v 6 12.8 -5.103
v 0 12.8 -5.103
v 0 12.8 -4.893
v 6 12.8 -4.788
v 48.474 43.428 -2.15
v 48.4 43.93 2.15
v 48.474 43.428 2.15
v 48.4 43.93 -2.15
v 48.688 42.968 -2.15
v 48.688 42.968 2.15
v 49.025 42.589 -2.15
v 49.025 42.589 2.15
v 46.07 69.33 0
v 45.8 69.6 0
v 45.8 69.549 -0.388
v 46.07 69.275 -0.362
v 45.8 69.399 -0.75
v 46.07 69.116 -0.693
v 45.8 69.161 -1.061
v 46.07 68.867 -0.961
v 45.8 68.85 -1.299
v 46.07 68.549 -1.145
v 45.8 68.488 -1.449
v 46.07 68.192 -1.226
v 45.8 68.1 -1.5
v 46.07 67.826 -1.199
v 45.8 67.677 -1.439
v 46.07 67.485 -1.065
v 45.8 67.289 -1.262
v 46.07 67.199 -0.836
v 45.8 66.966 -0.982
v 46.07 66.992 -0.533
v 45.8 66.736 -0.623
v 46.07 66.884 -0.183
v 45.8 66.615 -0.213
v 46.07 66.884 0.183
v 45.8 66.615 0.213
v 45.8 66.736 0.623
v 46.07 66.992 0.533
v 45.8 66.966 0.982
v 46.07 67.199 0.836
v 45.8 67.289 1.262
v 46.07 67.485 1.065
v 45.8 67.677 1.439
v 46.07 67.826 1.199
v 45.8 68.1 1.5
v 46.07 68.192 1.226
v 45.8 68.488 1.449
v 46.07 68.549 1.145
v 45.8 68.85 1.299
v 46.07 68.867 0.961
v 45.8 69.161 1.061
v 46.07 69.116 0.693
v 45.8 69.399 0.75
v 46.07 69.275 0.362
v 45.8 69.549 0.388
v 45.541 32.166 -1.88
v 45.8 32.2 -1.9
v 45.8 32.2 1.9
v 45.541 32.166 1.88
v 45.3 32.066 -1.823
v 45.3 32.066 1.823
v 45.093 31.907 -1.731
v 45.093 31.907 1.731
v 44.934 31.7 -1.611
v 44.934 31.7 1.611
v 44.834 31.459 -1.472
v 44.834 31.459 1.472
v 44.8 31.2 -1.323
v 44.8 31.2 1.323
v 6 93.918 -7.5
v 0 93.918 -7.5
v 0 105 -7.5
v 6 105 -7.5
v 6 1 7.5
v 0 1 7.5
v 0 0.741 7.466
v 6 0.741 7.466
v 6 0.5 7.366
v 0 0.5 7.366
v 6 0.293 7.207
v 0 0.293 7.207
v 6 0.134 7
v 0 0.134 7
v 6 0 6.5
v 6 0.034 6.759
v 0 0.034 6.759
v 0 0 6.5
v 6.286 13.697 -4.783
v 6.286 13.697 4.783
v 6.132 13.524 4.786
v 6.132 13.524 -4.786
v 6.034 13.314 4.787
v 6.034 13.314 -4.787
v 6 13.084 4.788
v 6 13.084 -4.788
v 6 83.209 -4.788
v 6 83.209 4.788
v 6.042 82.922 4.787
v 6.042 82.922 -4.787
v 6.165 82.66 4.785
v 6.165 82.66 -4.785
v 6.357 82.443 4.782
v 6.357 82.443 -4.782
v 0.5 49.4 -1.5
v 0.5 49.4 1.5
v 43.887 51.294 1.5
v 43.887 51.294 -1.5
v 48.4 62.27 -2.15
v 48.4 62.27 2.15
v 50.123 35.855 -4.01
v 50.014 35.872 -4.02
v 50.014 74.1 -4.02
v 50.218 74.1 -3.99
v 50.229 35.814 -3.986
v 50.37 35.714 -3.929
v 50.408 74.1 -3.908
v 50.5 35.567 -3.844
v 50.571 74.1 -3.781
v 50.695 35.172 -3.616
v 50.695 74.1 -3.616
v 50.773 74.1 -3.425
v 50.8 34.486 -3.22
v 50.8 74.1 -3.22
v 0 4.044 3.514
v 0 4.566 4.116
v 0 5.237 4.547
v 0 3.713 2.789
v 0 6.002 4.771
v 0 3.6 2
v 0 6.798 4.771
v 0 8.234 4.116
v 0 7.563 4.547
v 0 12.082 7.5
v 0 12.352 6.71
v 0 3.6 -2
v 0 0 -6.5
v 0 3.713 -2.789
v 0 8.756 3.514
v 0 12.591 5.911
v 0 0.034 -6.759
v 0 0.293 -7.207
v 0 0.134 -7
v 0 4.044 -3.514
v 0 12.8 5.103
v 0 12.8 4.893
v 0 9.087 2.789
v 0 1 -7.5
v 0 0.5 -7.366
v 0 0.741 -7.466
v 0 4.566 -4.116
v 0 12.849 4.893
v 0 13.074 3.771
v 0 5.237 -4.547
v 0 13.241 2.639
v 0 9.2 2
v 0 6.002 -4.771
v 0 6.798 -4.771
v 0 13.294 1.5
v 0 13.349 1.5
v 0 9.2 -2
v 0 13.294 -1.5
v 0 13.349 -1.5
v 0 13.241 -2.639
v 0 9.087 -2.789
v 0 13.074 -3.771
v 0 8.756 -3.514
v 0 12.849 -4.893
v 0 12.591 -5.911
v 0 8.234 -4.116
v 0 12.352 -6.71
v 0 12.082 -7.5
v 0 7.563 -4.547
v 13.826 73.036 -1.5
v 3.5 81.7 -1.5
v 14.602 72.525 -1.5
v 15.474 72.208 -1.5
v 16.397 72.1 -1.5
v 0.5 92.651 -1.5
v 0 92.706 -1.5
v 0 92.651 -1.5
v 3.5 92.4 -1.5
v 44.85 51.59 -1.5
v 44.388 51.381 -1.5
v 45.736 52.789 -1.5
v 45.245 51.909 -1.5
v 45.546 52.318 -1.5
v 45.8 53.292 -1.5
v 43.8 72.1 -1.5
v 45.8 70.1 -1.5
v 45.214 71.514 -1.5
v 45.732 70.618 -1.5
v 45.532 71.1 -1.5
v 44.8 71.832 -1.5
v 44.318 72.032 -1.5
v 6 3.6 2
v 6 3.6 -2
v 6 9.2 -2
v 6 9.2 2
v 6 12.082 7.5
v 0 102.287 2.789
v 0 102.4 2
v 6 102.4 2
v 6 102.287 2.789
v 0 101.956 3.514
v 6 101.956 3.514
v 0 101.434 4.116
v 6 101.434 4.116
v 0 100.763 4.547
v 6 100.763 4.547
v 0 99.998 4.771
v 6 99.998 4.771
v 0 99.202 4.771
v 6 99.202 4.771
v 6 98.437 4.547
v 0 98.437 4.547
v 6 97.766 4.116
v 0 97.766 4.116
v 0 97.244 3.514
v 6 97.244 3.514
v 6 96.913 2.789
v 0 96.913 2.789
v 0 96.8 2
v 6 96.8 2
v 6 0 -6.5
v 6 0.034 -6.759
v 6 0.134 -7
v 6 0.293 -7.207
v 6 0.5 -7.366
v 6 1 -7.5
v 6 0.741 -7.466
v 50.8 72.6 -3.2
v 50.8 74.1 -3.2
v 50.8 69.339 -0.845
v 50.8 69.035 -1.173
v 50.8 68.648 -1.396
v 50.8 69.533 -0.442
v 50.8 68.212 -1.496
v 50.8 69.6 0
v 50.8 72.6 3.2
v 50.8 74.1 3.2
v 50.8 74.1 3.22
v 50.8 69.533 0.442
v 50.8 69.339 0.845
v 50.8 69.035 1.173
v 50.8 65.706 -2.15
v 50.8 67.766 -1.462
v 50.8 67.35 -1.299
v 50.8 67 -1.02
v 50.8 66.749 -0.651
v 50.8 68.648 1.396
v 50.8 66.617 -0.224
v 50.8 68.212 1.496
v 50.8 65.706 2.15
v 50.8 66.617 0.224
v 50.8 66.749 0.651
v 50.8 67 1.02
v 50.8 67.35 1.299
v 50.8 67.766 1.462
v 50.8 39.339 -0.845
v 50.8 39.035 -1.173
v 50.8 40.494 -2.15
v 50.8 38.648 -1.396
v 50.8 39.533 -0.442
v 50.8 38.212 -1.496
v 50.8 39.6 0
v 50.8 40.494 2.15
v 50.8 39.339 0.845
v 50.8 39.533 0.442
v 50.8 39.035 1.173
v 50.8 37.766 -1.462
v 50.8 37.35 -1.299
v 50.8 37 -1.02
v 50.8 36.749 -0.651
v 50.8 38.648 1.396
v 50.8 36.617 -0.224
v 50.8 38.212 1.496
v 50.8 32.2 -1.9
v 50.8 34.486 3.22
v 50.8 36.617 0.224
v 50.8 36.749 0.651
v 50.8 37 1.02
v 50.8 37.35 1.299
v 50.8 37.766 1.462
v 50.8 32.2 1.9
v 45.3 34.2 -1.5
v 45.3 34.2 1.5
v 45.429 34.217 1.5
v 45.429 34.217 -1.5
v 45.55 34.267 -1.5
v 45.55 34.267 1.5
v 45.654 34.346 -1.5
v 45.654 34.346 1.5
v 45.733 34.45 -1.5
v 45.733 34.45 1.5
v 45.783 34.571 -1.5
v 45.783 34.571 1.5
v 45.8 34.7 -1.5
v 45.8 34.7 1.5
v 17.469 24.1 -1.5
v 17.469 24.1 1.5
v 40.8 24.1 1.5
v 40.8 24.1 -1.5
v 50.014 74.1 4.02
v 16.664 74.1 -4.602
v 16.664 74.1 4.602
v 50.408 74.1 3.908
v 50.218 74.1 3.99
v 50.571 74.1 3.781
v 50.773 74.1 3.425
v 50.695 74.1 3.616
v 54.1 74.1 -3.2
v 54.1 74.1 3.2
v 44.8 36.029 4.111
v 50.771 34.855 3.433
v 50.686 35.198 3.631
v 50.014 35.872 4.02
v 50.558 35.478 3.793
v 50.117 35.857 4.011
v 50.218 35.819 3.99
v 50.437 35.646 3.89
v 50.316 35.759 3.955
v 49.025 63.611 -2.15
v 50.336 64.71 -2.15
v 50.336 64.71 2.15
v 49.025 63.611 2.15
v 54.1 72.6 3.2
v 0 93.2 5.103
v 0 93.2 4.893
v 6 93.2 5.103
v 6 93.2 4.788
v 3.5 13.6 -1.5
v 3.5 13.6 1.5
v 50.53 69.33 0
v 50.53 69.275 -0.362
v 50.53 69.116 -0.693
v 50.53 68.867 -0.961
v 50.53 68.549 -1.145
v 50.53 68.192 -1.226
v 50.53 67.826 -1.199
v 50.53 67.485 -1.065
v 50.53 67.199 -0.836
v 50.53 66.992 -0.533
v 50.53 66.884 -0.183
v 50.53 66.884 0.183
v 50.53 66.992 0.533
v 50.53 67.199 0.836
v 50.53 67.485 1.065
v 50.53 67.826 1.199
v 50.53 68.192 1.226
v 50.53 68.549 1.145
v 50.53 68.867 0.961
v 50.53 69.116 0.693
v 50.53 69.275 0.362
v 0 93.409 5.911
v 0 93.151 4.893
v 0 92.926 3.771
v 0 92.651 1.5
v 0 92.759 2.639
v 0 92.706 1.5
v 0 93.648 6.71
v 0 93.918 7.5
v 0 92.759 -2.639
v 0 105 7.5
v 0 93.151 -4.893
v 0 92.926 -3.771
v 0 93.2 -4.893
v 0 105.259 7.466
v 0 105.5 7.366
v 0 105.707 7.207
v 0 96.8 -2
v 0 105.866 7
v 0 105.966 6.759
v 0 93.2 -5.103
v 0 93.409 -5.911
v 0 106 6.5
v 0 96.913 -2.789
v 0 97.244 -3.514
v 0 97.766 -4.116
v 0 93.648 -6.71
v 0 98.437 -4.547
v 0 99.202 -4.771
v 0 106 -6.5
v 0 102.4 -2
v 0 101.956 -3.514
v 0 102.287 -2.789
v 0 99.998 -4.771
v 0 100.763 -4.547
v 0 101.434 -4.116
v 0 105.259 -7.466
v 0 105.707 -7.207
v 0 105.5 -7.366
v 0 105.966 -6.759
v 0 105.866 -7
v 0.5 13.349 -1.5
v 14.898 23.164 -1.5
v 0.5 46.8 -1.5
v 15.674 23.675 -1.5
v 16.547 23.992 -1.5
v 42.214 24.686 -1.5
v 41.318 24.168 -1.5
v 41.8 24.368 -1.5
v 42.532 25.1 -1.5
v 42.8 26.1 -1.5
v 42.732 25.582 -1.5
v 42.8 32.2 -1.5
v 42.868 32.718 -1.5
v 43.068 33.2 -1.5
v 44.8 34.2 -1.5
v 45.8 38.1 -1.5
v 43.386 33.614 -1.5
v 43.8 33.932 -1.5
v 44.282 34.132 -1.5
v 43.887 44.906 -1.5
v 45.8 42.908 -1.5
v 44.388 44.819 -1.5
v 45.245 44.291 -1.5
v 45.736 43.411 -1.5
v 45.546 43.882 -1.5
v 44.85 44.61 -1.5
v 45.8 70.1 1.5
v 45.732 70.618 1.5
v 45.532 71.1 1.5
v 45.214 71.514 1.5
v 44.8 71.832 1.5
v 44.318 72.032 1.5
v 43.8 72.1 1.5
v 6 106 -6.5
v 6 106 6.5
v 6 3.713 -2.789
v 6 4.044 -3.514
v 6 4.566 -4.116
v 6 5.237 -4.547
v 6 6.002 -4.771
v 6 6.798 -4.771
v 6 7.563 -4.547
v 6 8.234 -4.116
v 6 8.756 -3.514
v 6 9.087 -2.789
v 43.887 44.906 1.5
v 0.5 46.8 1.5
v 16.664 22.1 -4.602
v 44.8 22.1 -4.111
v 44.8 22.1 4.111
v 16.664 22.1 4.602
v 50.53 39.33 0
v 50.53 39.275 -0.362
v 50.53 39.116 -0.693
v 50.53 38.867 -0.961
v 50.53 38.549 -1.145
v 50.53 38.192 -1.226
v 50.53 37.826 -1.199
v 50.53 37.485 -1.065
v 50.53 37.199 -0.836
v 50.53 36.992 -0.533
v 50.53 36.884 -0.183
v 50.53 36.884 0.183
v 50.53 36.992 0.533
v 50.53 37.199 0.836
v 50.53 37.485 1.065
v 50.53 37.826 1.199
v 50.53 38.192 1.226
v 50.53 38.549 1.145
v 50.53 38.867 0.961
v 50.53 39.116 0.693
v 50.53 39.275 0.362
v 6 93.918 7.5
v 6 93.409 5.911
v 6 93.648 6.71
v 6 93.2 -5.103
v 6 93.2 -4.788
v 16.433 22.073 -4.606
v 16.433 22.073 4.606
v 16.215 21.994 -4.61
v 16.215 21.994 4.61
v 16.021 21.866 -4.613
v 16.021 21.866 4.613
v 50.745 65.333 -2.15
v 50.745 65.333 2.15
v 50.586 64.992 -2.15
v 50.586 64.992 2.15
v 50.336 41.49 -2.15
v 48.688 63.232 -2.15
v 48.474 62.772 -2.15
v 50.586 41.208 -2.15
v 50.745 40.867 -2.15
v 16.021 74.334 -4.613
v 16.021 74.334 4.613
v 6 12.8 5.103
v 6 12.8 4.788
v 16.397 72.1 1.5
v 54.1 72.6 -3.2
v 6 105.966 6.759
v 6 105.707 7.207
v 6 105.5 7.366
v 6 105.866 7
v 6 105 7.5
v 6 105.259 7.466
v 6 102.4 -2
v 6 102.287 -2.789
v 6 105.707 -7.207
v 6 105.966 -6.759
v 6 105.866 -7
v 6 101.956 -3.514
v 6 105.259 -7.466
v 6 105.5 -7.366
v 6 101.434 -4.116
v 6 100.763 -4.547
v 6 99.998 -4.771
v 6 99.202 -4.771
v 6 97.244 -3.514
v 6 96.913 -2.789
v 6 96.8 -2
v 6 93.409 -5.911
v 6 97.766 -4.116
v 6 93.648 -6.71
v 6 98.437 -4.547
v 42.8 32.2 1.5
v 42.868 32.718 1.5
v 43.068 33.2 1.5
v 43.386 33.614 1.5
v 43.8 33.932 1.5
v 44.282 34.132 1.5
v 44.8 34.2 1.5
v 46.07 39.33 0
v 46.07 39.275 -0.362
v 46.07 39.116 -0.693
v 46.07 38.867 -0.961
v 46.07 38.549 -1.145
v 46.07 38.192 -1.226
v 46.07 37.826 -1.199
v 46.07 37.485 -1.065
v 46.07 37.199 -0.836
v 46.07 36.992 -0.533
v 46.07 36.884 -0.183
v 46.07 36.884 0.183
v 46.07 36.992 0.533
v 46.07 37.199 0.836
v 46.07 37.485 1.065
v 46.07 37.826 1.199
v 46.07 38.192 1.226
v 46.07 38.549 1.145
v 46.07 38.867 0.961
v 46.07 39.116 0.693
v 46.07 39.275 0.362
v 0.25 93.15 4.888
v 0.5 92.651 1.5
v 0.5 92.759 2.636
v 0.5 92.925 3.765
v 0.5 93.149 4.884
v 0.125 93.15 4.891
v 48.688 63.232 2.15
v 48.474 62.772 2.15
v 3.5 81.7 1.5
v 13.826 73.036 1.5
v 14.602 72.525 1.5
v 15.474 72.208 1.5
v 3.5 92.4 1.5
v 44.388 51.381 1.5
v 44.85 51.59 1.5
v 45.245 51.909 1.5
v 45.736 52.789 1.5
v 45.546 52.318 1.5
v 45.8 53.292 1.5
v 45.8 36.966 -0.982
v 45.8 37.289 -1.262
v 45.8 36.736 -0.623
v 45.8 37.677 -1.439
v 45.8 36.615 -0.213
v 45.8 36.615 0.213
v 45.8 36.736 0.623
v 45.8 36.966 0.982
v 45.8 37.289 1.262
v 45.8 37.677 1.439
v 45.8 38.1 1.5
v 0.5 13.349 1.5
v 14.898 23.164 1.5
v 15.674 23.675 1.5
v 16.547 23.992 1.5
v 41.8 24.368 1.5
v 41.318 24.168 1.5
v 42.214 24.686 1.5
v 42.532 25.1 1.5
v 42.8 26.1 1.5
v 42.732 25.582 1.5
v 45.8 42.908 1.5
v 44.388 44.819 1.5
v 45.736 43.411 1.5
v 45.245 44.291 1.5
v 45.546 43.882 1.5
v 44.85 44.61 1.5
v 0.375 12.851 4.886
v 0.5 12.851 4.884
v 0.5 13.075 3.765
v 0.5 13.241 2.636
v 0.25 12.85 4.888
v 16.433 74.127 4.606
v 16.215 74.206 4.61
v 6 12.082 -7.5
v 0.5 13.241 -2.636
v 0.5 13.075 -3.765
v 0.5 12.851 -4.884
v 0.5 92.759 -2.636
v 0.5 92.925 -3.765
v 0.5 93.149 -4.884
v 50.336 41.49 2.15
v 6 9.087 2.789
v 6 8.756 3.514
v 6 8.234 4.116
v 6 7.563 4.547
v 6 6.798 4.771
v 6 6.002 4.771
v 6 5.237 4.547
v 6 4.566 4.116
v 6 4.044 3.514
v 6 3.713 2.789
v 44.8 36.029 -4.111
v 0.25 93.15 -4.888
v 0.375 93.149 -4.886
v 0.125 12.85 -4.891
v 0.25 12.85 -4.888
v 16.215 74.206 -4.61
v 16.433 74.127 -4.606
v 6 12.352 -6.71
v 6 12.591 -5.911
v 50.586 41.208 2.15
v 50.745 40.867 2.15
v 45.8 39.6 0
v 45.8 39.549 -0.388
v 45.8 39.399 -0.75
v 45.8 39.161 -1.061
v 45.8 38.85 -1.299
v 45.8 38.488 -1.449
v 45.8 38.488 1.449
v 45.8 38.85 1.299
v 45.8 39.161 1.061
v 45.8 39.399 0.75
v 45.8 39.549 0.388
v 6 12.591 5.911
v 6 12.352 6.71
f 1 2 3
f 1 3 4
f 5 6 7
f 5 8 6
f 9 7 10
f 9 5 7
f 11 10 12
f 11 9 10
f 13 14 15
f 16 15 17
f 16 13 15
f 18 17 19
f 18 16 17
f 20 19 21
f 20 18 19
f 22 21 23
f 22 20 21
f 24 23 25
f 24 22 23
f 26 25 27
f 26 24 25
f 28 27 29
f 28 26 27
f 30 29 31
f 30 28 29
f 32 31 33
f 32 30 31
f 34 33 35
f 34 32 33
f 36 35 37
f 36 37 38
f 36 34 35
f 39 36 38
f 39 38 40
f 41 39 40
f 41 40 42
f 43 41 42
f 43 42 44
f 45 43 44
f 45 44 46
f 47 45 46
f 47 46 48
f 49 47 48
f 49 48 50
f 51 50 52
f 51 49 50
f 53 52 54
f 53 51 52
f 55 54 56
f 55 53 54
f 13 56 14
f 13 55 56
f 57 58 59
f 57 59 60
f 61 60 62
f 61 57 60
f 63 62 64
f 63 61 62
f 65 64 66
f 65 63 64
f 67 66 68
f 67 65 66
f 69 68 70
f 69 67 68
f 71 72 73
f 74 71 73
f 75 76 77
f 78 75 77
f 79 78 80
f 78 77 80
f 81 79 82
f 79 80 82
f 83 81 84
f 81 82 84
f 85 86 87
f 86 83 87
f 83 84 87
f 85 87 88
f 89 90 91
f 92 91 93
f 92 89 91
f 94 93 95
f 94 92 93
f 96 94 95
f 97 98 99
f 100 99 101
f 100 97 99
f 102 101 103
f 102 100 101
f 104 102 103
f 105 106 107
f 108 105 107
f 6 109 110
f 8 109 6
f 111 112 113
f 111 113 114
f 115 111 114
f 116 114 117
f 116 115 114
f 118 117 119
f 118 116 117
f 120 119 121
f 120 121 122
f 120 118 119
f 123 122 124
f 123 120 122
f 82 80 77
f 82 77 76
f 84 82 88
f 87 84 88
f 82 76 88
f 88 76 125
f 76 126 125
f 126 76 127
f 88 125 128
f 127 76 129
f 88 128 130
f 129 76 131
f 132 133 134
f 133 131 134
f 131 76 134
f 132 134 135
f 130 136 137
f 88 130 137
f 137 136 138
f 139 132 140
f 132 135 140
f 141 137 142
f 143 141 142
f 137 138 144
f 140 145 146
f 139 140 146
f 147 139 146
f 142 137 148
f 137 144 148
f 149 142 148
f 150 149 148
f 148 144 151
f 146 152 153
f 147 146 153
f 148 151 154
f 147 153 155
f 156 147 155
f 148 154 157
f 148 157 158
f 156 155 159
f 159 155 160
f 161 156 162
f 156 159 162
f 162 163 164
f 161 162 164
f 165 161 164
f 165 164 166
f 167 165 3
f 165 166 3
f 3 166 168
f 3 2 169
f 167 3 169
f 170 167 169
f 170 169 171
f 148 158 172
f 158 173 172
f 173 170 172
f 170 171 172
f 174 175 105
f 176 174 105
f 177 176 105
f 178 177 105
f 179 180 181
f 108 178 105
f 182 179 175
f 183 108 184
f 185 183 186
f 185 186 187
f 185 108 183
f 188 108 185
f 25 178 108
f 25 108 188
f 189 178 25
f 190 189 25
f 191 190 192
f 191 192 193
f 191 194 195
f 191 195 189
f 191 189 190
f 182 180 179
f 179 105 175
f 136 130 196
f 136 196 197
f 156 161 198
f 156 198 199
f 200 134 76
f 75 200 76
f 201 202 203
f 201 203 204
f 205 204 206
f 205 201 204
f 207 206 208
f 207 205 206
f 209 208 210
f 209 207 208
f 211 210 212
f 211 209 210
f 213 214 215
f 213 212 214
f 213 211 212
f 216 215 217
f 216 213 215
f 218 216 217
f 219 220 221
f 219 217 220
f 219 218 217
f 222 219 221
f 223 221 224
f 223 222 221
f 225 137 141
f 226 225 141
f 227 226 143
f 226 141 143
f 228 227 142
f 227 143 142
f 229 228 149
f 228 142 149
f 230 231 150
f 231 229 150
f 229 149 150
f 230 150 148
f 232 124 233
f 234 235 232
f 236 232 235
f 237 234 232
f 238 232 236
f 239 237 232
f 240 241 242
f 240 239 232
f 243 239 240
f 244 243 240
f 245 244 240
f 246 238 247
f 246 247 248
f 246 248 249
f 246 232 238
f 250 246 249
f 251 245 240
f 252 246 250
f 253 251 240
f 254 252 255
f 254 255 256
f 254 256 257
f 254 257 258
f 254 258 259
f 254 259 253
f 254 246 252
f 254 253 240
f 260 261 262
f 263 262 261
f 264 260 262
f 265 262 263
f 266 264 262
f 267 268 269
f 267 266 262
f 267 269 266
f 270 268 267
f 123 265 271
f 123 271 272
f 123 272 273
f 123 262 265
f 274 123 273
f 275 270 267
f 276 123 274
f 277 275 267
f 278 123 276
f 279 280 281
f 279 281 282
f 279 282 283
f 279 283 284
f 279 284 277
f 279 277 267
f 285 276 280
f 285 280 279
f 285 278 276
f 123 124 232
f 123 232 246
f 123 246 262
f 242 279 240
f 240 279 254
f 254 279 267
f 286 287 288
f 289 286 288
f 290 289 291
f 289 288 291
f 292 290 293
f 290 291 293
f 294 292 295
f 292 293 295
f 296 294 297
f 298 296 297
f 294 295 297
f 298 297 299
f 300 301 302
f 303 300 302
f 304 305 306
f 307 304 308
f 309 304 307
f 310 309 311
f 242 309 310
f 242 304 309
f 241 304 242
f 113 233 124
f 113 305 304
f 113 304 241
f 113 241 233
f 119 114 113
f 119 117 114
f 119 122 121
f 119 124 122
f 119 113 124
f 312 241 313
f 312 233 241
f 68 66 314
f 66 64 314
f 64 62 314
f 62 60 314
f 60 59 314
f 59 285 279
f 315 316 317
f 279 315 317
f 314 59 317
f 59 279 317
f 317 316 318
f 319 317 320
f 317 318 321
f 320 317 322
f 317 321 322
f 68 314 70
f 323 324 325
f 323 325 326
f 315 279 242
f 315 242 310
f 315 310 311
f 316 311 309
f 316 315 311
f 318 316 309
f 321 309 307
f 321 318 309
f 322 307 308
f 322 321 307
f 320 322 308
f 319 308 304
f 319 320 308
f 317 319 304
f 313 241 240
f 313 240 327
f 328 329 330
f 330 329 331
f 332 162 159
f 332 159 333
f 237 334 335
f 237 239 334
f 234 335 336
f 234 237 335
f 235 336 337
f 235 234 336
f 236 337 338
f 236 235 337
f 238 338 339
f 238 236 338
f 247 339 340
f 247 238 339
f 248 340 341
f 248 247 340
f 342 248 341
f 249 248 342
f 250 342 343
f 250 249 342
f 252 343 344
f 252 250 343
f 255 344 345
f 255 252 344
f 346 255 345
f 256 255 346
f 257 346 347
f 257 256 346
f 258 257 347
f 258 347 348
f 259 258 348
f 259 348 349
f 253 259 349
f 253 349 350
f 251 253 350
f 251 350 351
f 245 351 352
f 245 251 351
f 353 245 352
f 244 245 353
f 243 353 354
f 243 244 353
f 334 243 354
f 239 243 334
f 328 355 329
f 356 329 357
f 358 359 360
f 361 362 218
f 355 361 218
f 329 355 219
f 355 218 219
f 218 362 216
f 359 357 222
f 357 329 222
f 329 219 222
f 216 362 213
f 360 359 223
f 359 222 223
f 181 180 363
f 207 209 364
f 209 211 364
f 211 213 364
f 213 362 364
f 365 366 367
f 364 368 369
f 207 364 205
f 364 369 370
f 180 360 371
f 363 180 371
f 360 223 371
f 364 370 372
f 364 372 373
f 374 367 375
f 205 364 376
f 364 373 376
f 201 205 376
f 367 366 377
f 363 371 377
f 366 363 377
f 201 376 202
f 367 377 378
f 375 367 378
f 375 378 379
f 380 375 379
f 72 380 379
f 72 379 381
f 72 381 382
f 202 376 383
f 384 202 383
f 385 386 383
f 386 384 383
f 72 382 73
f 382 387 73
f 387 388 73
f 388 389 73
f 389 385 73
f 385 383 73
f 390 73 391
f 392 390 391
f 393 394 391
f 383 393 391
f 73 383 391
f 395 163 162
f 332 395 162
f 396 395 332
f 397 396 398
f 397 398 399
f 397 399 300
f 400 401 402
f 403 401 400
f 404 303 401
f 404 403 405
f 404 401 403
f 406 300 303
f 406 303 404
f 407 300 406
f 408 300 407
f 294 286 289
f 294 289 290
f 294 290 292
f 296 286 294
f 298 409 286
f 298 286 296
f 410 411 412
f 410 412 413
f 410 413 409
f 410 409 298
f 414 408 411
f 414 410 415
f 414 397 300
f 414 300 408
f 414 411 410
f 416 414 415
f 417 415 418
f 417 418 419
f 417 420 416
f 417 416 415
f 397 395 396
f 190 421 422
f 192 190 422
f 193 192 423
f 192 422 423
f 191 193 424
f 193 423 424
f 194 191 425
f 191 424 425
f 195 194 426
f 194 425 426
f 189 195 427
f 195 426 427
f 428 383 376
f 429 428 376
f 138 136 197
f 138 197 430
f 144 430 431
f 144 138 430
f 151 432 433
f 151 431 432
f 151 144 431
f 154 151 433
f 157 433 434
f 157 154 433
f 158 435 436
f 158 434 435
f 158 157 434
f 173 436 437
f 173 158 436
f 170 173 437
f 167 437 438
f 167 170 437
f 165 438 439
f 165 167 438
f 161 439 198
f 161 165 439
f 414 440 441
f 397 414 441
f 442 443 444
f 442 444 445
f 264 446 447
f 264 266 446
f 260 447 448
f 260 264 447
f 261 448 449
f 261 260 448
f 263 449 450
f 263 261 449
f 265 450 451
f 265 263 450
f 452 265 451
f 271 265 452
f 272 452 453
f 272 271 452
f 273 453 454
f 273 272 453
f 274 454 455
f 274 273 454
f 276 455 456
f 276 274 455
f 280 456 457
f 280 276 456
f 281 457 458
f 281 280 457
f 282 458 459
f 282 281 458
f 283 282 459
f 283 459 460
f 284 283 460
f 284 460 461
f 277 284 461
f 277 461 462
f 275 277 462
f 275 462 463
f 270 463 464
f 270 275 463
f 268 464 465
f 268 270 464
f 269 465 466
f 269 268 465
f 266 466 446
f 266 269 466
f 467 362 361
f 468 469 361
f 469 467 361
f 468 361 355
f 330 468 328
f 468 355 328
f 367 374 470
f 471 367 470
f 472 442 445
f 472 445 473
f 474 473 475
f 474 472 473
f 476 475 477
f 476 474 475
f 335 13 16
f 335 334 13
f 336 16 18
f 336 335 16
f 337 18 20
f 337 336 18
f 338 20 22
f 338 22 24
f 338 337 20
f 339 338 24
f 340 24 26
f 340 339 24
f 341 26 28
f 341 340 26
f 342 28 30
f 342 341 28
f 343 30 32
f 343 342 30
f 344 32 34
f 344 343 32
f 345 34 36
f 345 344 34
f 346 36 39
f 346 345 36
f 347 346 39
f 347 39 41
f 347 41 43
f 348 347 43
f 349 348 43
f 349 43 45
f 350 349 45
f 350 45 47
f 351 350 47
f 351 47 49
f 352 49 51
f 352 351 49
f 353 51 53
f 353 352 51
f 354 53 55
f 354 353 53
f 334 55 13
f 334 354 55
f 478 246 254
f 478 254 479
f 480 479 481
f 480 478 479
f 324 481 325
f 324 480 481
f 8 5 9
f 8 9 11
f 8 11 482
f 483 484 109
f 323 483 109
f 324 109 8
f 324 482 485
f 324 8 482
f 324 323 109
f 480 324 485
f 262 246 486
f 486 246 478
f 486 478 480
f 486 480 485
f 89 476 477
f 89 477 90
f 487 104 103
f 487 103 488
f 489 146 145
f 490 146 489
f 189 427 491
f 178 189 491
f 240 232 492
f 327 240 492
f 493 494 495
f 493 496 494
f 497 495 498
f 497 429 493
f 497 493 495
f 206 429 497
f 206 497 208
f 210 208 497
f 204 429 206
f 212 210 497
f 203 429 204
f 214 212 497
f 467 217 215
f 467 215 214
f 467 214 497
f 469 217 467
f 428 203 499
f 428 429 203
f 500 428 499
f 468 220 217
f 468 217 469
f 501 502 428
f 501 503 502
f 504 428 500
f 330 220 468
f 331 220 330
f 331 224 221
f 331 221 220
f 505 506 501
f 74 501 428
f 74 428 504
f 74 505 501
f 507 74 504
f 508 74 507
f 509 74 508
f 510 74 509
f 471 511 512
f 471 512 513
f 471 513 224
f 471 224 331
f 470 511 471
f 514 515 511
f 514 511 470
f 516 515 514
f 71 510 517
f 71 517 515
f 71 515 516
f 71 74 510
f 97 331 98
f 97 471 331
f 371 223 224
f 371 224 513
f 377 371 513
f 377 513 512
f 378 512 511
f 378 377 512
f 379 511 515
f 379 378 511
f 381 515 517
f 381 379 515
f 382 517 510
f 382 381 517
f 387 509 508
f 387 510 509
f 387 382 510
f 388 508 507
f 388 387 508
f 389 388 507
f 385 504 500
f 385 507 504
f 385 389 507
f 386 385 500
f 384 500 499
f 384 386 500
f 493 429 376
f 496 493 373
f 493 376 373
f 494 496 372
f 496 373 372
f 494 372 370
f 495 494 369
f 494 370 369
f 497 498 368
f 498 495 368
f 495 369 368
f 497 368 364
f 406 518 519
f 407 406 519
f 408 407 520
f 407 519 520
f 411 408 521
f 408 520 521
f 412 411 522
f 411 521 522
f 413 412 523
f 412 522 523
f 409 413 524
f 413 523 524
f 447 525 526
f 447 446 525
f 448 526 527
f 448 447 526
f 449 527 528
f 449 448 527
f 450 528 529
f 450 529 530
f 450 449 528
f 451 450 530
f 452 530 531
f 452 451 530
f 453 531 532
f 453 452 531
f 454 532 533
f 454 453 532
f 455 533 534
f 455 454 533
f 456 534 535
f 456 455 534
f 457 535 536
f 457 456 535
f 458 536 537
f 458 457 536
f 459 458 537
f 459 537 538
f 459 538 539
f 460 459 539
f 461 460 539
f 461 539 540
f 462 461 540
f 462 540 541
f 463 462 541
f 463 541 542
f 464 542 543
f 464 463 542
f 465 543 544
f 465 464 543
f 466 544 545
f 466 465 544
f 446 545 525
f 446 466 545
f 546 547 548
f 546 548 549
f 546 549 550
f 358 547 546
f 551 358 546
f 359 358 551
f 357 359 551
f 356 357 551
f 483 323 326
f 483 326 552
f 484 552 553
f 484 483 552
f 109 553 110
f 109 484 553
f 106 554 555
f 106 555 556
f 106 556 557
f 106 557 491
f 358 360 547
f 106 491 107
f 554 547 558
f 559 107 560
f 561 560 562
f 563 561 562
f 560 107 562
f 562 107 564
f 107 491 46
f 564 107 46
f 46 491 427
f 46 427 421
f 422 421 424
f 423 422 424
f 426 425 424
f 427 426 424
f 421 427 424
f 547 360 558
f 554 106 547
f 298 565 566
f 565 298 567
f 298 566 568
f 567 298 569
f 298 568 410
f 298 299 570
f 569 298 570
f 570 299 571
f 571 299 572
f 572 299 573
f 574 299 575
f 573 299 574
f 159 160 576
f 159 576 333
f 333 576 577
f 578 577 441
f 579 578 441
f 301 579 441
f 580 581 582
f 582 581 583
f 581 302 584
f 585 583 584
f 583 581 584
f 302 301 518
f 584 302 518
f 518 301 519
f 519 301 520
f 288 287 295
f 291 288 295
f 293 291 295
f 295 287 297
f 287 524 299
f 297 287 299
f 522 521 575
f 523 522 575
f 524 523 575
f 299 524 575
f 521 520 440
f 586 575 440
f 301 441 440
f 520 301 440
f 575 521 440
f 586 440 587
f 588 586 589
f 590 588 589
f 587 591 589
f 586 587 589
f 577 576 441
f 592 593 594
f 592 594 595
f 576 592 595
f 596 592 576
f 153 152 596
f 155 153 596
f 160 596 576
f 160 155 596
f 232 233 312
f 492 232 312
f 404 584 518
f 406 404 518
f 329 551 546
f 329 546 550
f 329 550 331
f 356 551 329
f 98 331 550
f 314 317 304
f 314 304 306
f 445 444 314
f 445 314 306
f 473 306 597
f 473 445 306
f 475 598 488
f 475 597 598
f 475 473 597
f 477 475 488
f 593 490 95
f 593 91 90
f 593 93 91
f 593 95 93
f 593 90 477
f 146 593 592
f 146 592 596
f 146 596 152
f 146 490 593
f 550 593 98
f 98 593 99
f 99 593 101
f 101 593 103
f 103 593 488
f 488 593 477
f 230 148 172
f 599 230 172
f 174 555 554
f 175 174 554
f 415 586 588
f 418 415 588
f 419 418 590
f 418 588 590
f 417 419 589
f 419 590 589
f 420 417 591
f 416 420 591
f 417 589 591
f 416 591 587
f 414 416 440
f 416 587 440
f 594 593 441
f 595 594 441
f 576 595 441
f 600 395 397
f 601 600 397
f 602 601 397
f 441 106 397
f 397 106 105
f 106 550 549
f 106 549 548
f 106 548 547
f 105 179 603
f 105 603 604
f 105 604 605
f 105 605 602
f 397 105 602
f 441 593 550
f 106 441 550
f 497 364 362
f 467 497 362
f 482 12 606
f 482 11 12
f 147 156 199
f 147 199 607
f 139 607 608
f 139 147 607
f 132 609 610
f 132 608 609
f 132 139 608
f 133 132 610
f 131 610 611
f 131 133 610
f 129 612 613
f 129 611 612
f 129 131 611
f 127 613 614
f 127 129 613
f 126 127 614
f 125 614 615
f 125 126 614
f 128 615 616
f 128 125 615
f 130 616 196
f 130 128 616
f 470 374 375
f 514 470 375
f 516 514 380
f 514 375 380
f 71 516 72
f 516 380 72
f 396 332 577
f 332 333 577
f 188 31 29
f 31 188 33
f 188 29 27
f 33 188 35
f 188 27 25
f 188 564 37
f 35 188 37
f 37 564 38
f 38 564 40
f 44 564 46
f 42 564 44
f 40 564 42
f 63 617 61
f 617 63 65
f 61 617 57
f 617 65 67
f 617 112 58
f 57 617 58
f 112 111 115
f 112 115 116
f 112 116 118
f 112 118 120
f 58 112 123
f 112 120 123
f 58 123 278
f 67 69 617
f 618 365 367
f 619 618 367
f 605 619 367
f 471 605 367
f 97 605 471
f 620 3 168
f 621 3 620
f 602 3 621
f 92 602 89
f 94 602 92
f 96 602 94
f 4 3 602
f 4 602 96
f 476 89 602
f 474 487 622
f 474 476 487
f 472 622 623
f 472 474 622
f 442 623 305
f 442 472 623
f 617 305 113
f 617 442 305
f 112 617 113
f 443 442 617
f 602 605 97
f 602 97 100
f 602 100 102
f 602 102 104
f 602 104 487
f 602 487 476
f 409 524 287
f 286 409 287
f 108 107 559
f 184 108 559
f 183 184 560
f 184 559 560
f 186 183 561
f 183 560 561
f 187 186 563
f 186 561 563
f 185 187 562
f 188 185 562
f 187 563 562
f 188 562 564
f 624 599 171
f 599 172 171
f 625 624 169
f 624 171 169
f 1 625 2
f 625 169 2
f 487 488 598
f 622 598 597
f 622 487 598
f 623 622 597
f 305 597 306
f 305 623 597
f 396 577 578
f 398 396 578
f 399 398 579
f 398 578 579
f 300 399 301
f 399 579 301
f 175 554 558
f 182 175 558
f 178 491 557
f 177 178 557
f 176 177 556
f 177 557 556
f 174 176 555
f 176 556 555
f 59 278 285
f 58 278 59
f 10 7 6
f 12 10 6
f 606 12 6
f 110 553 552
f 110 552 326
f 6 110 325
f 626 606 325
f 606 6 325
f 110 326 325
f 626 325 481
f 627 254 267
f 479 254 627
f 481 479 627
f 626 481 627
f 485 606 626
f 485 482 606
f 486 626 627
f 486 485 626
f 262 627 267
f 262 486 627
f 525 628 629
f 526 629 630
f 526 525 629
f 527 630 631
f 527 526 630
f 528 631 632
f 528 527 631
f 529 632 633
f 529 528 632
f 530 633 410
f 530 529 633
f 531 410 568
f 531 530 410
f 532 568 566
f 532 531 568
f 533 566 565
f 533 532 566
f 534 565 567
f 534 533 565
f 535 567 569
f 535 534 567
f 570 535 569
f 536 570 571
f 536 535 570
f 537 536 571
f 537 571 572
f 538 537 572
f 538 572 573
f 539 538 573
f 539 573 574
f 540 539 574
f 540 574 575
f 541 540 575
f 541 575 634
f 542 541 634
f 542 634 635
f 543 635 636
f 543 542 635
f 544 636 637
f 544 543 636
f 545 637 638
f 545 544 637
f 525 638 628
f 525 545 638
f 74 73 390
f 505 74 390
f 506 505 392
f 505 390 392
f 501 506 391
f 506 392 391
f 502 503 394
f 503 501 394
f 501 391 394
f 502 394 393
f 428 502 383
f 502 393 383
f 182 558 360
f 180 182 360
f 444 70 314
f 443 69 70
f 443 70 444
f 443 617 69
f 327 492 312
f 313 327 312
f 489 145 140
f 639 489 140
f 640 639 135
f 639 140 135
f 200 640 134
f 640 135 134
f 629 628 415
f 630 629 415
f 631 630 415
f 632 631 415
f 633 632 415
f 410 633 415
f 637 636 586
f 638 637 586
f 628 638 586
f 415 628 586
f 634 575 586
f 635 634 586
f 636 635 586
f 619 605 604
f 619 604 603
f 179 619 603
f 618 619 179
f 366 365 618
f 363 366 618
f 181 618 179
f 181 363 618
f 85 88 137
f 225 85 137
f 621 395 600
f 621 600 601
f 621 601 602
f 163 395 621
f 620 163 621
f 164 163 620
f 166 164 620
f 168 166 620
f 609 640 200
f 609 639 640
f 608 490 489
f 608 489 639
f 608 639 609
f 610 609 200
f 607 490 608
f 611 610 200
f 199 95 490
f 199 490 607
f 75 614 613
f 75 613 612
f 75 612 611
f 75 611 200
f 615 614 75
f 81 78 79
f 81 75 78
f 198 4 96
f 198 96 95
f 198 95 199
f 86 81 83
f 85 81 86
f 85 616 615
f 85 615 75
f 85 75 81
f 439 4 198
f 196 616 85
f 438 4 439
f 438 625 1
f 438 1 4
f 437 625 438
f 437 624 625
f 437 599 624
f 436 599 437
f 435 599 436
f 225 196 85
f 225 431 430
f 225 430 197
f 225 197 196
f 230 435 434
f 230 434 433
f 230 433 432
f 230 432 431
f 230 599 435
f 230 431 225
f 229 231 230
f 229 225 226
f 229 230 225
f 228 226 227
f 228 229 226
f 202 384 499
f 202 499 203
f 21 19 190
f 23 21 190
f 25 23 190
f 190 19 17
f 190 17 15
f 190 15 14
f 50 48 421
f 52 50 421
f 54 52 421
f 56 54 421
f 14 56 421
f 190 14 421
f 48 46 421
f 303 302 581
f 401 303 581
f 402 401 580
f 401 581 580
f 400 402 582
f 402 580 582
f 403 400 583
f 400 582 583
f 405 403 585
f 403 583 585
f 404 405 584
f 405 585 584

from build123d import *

# Parameters (mm, degrees)
BOSS_EXTRUDE1_DEPTH      = 51
CUT_EXTRUDE1_DEPTH       = 10
CUT_EXTRUDE1_DEPTH_BACK  = 10
CUT_EXTRUDE2_DEPTH       = 10
CUT_EXTRUDE2_DEPTH_BACK  = 10
CUT_EXTRUDE3_DEPTH       = 10
CUT_EXTRUDE3_DEPTH_BACK  = 10
CUT_EXTRUDE4_DEPTH       = 0.5
CUT_EXTRUDE4_DEPTH_BACK  = 0.5
CUT_EXTRUDE5_DEPTH       = 80.4
CUT_EXTRUDE6_DEPTH       = 1.5
CUT_EXTRUDE6_DEPTH_BACK  = 1.5
SKETCH8_W                = 3.8
SKETCH8_H                = 1.5
BOSS_EXTRUDE2_DEPTH      = 3.2
BOSS_EXTRUDE2_DEPTH_BACK = 3.2
CUT_EXTRUDE7_DEPTH       = 2.15
CUT_EXTRUDE7_DEPTH_BACK  = 2.15
CUT_EXTRUDE8_DEPTH       = 6
CUT_EXTRUDE8_DEPTH_BACK  = 6


with BuildPart() as part:
    # Sketch1 → Boss-Extrude1 (new body)
    with BuildSketch(Plane(origin=(0, 0, 0), x_dir=(0, 0, -1), z_dir=(1, 0, 0))):
        with BuildLine():
            Line((-7.5, 105), (-7.5, 93.91788212))
            ThreePointArc((-7.5, 93.91788212), (-6.261006558, 93.509722693), (-5, 93.175714714))
            Line((-5, 93.175714714), (-5, 12.824285286))
            ThreePointArc((-5, 12.824285286), (-6.261006558, 12.490277307), (-7.5, 12.08211788))
            Line((-7.5, 12.08211788), (-7.5, 1))
            ThreePointArc((-7.5, 1), (-7.207106781, 0.292893219), (-6.5, 0))
            Line((-6.5, 0), (6.5, 0))
            ThreePointArc((6.5, 0), (7.207106781, 0.292893219), (7.5, 1))
            Line((7.5, 1), (7.5, 12.08211788))
            ThreePointArc((7.5, 12.08211788), (6.261006558, 12.490277307), (5, 12.824285286))
            Line((5, 12.824285286), (5, 93.175714714))
            ThreePointArc((5, 93.175714714), (6.261006558, 93.509722693), (7.5, 93.91788212))
            Line((7.5, 93.91788212), (7.5, 105))
            ThreePointArc((7.5, 105), (7.207106781, 105.707106781), (6.5, 106))
            Line((6.5, 106), (-6.5, 106))
            ThreePointArc((-6.5, 106), (-7.207106781, 105.707106781), (-7.5, 105))
        make_face()
    extrude(amount=BOSS_EXTRUDE1_DEPTH)

    # Sketch2 → Cut-Extrude1 (cut, two sides)
    with BuildSketch(Plane.XY) as cut_extrude1_sk:
        with BuildLine():
            Line((6, 155.065), (6, 83.209033859))
            ThreePointArc((6, 83.209033859), (6.093692213, 82.786415598), (6.35721239, 82.442989416))
            Line((6.35721239, 82.442989416), (16.021182625, 74.333955557))
            ThreePointArc((16.021182625, 74.333955557), (16.321950091, 74.160307379), (16.663970234, 74.1))
            Line((16.663970234, 74.1), (95, 74.1))
            Line((95, 74.1), (95, 32.2))
            Line((95, 32.2), (45.8, 32.2))
            ThreePointArc((45.8, 32.2), (45.092893219, 31.907106781), (44.8, 31.2))
            Line((44.8, 31.2), (44.8, 22.1))
            Line((44.8, 22.1), (16.663970234, 22.1))
            ThreePointArc((16.663970234, 22.1), (16.321950091, 22.039692621), (16.021182625, 21.866044443))
            Line((16.021182625, 21.866044443), (6.285769912, 13.697063227))
            ThreePointArc((6.285769912, 13.697063227), (6.07495377, 13.422322282), (6, 13.084227672))
            Line((6, 13.084227672), (6, -150))
            Line((6, -150), (100, -150))
            Line((100, -150), (100, 155.065))
            Line((100, 155.065), (6, 155.065))
        make_face()
    extrude(amount=CUT_EXTRUDE1_DEPTH, mode=Mode.SUBTRACT)
    extrude(cut_extrude1_sk.sketch, amount=-CUT_EXTRUDE1_DEPTH_BACK, mode=Mode.SUBTRACT)

    # Sketch3 → Cut-Extrude2 (cut, two sides)
    with BuildSketch(Plane(origin=(0, 0, 0), x_dir=(0, 0, -1), z_dir=(1, 0, 0))) as cut_extrude2_sk:
        with BuildLine():
            Line((-2, 3.6), (2, 3.6))
            ThreePointArc((2, 3.6), (4.799999867, 6.4), (2, 9.2))
            Line((2, 9.2), (-2, 9.2))
            ThreePointArc((-2, 9.2), (-4.799999867, 6.4), (-2, 3.6))
        make_face()
    extrude(amount=CUT_EXTRUDE2_DEPTH, mode=Mode.SUBTRACT)
    extrude(cut_extrude2_sk.sketch, amount=-CUT_EXTRUDE2_DEPTH_BACK, mode=Mode.SUBTRACT)

    # Sketch4 → Cut-Extrude3 (cut, two sides)
    with BuildSketch(Plane(origin=(0, 0, 0), x_dir=(0, 0, -1), z_dir=(1, 0, 0))) as cut_extrude3_sk:
        with BuildLine():
            Line((-2, 96.8), (2, 96.8))
            ThreePointArc((2, 96.8), (4.799999867, 99.6), (2, 102.4))
            Line((2, 102.4), (-2, 102.4))
            ThreePointArc((-2, 102.4), (-4.799999867, 99.6), (-2, 96.8))
        make_face()
    extrude(amount=CUT_EXTRUDE3_DEPTH, mode=Mode.SUBTRACT)
    extrude(cut_extrude3_sk.sketch, amount=-CUT_EXTRUDE3_DEPTH_BACK, mode=Mode.SUBTRACT)

    # Sketch5 → Cut-Extrude4 (cut, two sides)
    with BuildSketch(Plane(origin=(0, 0, 0), x_dir=(0, 0, -1), z_dir=(1, 0, 0))) as cut_extrude4_sk:
        with BuildLine():
            Line((-8, 94.106098468), (-8, 11.893901532))
            ThreePointArc((-8, 11.893901532), (0, 13.4), (8, 11.893901532))
            Line((8, 11.893901532), (8, 94.106098468))
            ThreePointArc((8, 94.106098468), (0, 92.6), (-8, 94.106098468))
        make_face()
    extrude(amount=CUT_EXTRUDE4_DEPTH, mode=Mode.SUBTRACT)
    extrude(cut_extrude4_sk.sketch, amount=-CUT_EXTRUDE4_DEPTH_BACK, mode=Mode.SUBTRACT)

    # Sketch6 → Cut-Extrude5 (cut)
    with BuildSketch(Plane(origin=(0, 12.8, 0), x_dir=(1, 0, 0), z_dir=(0, 1, 0))):
        with BuildLine():
            Line((-7.83333, -20.4458), (56.7096, -20.4458))
            Line((56.7096, -20.4458), (56.7096, 14.6041))
            Line((56.7096, 14.6041), (-7.83333, 14.6041))
            Line((-7.83333, 14.6041), (-7.83333, 5.029470245))
            Line((-7.83333, 5.029470245), (50.013961925, 4.019742008))
            ThreePointArc((50.013961925, 4.019742008), (50.570600359, 3.780591263), (50.8, 3.219863852))
            Line((50.8, 3.219863852), (50.8, -3.219863852))
            ThreePointArc((50.8, -3.219863852), (50.570600359, -3.780591263), (50.013961925, -4.019742008))
            Line((50.013961925, -4.019742008), (-7.83333, -5.029470245))
            Line((-7.83333, -5.029470245), (-7.83333, -20.4458))
        make_face()
    extrude(amount=CUT_EXTRUDE5_DEPTH, mode=Mode.SUBTRACT)

    # Sketch7 → Cut-Extrude6 (cut, two sides)
    with BuildSketch(Plane.XY) as cut_extrude6_sk:
        with BuildLine():
            Line((-49.796416348, 97.062832237), (-49.796416348, 8.937167763))
            Line((-49.796416348, 8.937167763), (3.5, 13.6))
            Line((3.5, 13.6), (14.898143221, 23.164177772))
            ThreePointArc((14.898143221, 23.164177772), (16.101213086, 23.858770483), (17.469293659, 24.1))
            Line((17.469293659, 24.1), (40.8, 24.1))
            ThreePointArc((40.8, 24.1), (42.214213562, 24.685786438), (42.8, 26.1))
            Line((42.8, 26.1), (42.8, 32.2))
            ThreePointArc((42.8, 32.2), (43.385786438, 33.614213562), (44.8, 34.2))
            Line((44.8, 34.2), (45.3, 34.2))
            ThreePointArc((45.3, 34.2), (45.653553391, 34.346446609), (45.8, 34.7))
            Line((45.8, 34.7), (45.8, 42.907575802))
            ThreePointArc((45.8, 42.907575802), (45.244727924, 44.290601913), (43.887238775, 44.905672245))
            Line((43.887238775, 44.905672245), (-0.5, 46.843660943))
            Line((-0.5, 46.843660943), (-0.5, 49.356339057))
            Line((-0.5, 49.356339057), (43.887238775, 51.294327755))
            ThreePointArc((43.887238775, 51.294327755), (45.244727924, 51.909398087), (45.8, 53.292424198))
            Line((45.8, 53.292424198), (45.8, 70.1))
            ThreePointArc((45.8, 70.1), (45.214213562, 71.514213562), (43.8, 72.1))
            Line((43.8, 72.1), (16.396715426, 72.1))
            ThreePointArc((16.396715426, 72.1), (15.028634853, 72.341229517), (13.825564987, 73.035822228))
            Line((13.825564987, 73.035822228), (3.5, 81.7))
            Line((3.5, 81.7), (3.5, 92.4))
            Line((3.5, 92.4), (-49.796416348, 97.062832237))
        make_face()
    extrude(amount=CUT_EXTRUDE6_DEPTH, mode=Mode.SUBTRACT)
    extrude(cut_extrude6_sk.sketch, amount=-CUT_EXTRUDE6_DEPTH_BACK, mode=Mode.SUBTRACT)

    # Sketch8 → Boss-Extrude2 (add, two sides)
    with BuildSketch(Plane.XY) as boss_extrude2_sk:
        with Locations((52.2, 73.35)):
            Rectangle(SKETCH8_W, SKETCH8_H)
    extrude(amount=BOSS_EXTRUDE2_DEPTH)
    extrude(boss_extrude2_sk.sketch, amount=-BOSS_EXTRUDE2_DEPTH_BACK)

    # Sketch9 → Cut-Extrude7 (cut, two sides)
    with BuildSketch(Plane.XY) as cut_extrude7_sk:
        with BuildLine():
            Line((48.4, 62.270122483), (48.4, 43.929877517))
            ThreePointArc((48.4, 43.929877517), (48.563961373, 43.190295559), (49.025121683, 42.589299741))
            Line((49.025121683, 42.589299741), (50.335623893, 41.48965782))
            ThreePointArc((50.335623893, 41.48965782), (50.678200123, 41.043203785), (50.8, 40.493800044))
            Line((50.8, 40.493800044), (55.7133, 36.977251782))
            Line((55.7133, 36.977251782), (55.7133, 69.222748218))
            Line((55.7133, 69.222748218), (50.8, 65.706199956))
            ThreePointArc((50.8, 65.706199956), (50.678200123, 65.156796215), (50.335623893, 64.71034218))
            Line((50.335623893, 64.71034218), (49.025121683, 63.610700259))
            ThreePointArc((49.025121683, 63.610700259), (48.563961373, 63.009704441), (48.4, 62.270122483))
        make_face()
    extrude(amount=CUT_EXTRUDE7_DEPTH, mode=Mode.SUBTRACT)
    extrude(cut_extrude7_sk.sketch, amount=-CUT_EXTRUDE7_DEPTH_BACK, mode=Mode.SUBTRACT)

    # Sketch10 → Cut-Revolve1 (revolve, cut)
    with BuildSketch(Plane.XY):
        Polygon((45.8, 68.1), (45.8, 69.6), (46.0705, 69.3295), (50.5295, 69.3295), (50.8, 69.6), (50.8, 68.1), align=None)
    revolve(axis=Axis((50.8, 68.1, 0), (-1, 0, 0)), mode=Mode.SUBTRACT)

    # Sketch11 → Cut-Revolve2 (revolve, cut)
    with BuildSketch(Plane.XY):
        Polygon((45.8, 38.1), (45.8, 39.6), (46.0705, 39.3295), (50.5295, 39.3295), (50.8, 39.6), (50.8, 38.1), align=None)
    revolve(axis=Axis((50.8, 38.1, 0), (-1, 0, 0)), mode=Mode.SUBTRACT)

    # Sketch12 → Cut-Extrude8 (cut, two sides)
    with BuildSketch(Plane(origin=(50.8, 0, 0), x_dir=(0, 0, -1), z_dir=(1, 0, 0))) as cut_extrude8_sk:
        Polygon((-16.0833, 30.7), (16.9167, 30.7), (16.9167, 58.209687362), (1.322649731, 31.2), (-1.322649731, 31.2), (-16.0833, 56.766196219), align=None)
    extrude(amount=CUT_EXTRUDE8_DEPTH, mode=Mode.SUBTRACT)
    extrude(cut_extrude8_sk.sketch, amount=-CUT_EXTRUDE8_DEPTH_BACK, mode=Mode.SUBTRACT)


solid = part.part
